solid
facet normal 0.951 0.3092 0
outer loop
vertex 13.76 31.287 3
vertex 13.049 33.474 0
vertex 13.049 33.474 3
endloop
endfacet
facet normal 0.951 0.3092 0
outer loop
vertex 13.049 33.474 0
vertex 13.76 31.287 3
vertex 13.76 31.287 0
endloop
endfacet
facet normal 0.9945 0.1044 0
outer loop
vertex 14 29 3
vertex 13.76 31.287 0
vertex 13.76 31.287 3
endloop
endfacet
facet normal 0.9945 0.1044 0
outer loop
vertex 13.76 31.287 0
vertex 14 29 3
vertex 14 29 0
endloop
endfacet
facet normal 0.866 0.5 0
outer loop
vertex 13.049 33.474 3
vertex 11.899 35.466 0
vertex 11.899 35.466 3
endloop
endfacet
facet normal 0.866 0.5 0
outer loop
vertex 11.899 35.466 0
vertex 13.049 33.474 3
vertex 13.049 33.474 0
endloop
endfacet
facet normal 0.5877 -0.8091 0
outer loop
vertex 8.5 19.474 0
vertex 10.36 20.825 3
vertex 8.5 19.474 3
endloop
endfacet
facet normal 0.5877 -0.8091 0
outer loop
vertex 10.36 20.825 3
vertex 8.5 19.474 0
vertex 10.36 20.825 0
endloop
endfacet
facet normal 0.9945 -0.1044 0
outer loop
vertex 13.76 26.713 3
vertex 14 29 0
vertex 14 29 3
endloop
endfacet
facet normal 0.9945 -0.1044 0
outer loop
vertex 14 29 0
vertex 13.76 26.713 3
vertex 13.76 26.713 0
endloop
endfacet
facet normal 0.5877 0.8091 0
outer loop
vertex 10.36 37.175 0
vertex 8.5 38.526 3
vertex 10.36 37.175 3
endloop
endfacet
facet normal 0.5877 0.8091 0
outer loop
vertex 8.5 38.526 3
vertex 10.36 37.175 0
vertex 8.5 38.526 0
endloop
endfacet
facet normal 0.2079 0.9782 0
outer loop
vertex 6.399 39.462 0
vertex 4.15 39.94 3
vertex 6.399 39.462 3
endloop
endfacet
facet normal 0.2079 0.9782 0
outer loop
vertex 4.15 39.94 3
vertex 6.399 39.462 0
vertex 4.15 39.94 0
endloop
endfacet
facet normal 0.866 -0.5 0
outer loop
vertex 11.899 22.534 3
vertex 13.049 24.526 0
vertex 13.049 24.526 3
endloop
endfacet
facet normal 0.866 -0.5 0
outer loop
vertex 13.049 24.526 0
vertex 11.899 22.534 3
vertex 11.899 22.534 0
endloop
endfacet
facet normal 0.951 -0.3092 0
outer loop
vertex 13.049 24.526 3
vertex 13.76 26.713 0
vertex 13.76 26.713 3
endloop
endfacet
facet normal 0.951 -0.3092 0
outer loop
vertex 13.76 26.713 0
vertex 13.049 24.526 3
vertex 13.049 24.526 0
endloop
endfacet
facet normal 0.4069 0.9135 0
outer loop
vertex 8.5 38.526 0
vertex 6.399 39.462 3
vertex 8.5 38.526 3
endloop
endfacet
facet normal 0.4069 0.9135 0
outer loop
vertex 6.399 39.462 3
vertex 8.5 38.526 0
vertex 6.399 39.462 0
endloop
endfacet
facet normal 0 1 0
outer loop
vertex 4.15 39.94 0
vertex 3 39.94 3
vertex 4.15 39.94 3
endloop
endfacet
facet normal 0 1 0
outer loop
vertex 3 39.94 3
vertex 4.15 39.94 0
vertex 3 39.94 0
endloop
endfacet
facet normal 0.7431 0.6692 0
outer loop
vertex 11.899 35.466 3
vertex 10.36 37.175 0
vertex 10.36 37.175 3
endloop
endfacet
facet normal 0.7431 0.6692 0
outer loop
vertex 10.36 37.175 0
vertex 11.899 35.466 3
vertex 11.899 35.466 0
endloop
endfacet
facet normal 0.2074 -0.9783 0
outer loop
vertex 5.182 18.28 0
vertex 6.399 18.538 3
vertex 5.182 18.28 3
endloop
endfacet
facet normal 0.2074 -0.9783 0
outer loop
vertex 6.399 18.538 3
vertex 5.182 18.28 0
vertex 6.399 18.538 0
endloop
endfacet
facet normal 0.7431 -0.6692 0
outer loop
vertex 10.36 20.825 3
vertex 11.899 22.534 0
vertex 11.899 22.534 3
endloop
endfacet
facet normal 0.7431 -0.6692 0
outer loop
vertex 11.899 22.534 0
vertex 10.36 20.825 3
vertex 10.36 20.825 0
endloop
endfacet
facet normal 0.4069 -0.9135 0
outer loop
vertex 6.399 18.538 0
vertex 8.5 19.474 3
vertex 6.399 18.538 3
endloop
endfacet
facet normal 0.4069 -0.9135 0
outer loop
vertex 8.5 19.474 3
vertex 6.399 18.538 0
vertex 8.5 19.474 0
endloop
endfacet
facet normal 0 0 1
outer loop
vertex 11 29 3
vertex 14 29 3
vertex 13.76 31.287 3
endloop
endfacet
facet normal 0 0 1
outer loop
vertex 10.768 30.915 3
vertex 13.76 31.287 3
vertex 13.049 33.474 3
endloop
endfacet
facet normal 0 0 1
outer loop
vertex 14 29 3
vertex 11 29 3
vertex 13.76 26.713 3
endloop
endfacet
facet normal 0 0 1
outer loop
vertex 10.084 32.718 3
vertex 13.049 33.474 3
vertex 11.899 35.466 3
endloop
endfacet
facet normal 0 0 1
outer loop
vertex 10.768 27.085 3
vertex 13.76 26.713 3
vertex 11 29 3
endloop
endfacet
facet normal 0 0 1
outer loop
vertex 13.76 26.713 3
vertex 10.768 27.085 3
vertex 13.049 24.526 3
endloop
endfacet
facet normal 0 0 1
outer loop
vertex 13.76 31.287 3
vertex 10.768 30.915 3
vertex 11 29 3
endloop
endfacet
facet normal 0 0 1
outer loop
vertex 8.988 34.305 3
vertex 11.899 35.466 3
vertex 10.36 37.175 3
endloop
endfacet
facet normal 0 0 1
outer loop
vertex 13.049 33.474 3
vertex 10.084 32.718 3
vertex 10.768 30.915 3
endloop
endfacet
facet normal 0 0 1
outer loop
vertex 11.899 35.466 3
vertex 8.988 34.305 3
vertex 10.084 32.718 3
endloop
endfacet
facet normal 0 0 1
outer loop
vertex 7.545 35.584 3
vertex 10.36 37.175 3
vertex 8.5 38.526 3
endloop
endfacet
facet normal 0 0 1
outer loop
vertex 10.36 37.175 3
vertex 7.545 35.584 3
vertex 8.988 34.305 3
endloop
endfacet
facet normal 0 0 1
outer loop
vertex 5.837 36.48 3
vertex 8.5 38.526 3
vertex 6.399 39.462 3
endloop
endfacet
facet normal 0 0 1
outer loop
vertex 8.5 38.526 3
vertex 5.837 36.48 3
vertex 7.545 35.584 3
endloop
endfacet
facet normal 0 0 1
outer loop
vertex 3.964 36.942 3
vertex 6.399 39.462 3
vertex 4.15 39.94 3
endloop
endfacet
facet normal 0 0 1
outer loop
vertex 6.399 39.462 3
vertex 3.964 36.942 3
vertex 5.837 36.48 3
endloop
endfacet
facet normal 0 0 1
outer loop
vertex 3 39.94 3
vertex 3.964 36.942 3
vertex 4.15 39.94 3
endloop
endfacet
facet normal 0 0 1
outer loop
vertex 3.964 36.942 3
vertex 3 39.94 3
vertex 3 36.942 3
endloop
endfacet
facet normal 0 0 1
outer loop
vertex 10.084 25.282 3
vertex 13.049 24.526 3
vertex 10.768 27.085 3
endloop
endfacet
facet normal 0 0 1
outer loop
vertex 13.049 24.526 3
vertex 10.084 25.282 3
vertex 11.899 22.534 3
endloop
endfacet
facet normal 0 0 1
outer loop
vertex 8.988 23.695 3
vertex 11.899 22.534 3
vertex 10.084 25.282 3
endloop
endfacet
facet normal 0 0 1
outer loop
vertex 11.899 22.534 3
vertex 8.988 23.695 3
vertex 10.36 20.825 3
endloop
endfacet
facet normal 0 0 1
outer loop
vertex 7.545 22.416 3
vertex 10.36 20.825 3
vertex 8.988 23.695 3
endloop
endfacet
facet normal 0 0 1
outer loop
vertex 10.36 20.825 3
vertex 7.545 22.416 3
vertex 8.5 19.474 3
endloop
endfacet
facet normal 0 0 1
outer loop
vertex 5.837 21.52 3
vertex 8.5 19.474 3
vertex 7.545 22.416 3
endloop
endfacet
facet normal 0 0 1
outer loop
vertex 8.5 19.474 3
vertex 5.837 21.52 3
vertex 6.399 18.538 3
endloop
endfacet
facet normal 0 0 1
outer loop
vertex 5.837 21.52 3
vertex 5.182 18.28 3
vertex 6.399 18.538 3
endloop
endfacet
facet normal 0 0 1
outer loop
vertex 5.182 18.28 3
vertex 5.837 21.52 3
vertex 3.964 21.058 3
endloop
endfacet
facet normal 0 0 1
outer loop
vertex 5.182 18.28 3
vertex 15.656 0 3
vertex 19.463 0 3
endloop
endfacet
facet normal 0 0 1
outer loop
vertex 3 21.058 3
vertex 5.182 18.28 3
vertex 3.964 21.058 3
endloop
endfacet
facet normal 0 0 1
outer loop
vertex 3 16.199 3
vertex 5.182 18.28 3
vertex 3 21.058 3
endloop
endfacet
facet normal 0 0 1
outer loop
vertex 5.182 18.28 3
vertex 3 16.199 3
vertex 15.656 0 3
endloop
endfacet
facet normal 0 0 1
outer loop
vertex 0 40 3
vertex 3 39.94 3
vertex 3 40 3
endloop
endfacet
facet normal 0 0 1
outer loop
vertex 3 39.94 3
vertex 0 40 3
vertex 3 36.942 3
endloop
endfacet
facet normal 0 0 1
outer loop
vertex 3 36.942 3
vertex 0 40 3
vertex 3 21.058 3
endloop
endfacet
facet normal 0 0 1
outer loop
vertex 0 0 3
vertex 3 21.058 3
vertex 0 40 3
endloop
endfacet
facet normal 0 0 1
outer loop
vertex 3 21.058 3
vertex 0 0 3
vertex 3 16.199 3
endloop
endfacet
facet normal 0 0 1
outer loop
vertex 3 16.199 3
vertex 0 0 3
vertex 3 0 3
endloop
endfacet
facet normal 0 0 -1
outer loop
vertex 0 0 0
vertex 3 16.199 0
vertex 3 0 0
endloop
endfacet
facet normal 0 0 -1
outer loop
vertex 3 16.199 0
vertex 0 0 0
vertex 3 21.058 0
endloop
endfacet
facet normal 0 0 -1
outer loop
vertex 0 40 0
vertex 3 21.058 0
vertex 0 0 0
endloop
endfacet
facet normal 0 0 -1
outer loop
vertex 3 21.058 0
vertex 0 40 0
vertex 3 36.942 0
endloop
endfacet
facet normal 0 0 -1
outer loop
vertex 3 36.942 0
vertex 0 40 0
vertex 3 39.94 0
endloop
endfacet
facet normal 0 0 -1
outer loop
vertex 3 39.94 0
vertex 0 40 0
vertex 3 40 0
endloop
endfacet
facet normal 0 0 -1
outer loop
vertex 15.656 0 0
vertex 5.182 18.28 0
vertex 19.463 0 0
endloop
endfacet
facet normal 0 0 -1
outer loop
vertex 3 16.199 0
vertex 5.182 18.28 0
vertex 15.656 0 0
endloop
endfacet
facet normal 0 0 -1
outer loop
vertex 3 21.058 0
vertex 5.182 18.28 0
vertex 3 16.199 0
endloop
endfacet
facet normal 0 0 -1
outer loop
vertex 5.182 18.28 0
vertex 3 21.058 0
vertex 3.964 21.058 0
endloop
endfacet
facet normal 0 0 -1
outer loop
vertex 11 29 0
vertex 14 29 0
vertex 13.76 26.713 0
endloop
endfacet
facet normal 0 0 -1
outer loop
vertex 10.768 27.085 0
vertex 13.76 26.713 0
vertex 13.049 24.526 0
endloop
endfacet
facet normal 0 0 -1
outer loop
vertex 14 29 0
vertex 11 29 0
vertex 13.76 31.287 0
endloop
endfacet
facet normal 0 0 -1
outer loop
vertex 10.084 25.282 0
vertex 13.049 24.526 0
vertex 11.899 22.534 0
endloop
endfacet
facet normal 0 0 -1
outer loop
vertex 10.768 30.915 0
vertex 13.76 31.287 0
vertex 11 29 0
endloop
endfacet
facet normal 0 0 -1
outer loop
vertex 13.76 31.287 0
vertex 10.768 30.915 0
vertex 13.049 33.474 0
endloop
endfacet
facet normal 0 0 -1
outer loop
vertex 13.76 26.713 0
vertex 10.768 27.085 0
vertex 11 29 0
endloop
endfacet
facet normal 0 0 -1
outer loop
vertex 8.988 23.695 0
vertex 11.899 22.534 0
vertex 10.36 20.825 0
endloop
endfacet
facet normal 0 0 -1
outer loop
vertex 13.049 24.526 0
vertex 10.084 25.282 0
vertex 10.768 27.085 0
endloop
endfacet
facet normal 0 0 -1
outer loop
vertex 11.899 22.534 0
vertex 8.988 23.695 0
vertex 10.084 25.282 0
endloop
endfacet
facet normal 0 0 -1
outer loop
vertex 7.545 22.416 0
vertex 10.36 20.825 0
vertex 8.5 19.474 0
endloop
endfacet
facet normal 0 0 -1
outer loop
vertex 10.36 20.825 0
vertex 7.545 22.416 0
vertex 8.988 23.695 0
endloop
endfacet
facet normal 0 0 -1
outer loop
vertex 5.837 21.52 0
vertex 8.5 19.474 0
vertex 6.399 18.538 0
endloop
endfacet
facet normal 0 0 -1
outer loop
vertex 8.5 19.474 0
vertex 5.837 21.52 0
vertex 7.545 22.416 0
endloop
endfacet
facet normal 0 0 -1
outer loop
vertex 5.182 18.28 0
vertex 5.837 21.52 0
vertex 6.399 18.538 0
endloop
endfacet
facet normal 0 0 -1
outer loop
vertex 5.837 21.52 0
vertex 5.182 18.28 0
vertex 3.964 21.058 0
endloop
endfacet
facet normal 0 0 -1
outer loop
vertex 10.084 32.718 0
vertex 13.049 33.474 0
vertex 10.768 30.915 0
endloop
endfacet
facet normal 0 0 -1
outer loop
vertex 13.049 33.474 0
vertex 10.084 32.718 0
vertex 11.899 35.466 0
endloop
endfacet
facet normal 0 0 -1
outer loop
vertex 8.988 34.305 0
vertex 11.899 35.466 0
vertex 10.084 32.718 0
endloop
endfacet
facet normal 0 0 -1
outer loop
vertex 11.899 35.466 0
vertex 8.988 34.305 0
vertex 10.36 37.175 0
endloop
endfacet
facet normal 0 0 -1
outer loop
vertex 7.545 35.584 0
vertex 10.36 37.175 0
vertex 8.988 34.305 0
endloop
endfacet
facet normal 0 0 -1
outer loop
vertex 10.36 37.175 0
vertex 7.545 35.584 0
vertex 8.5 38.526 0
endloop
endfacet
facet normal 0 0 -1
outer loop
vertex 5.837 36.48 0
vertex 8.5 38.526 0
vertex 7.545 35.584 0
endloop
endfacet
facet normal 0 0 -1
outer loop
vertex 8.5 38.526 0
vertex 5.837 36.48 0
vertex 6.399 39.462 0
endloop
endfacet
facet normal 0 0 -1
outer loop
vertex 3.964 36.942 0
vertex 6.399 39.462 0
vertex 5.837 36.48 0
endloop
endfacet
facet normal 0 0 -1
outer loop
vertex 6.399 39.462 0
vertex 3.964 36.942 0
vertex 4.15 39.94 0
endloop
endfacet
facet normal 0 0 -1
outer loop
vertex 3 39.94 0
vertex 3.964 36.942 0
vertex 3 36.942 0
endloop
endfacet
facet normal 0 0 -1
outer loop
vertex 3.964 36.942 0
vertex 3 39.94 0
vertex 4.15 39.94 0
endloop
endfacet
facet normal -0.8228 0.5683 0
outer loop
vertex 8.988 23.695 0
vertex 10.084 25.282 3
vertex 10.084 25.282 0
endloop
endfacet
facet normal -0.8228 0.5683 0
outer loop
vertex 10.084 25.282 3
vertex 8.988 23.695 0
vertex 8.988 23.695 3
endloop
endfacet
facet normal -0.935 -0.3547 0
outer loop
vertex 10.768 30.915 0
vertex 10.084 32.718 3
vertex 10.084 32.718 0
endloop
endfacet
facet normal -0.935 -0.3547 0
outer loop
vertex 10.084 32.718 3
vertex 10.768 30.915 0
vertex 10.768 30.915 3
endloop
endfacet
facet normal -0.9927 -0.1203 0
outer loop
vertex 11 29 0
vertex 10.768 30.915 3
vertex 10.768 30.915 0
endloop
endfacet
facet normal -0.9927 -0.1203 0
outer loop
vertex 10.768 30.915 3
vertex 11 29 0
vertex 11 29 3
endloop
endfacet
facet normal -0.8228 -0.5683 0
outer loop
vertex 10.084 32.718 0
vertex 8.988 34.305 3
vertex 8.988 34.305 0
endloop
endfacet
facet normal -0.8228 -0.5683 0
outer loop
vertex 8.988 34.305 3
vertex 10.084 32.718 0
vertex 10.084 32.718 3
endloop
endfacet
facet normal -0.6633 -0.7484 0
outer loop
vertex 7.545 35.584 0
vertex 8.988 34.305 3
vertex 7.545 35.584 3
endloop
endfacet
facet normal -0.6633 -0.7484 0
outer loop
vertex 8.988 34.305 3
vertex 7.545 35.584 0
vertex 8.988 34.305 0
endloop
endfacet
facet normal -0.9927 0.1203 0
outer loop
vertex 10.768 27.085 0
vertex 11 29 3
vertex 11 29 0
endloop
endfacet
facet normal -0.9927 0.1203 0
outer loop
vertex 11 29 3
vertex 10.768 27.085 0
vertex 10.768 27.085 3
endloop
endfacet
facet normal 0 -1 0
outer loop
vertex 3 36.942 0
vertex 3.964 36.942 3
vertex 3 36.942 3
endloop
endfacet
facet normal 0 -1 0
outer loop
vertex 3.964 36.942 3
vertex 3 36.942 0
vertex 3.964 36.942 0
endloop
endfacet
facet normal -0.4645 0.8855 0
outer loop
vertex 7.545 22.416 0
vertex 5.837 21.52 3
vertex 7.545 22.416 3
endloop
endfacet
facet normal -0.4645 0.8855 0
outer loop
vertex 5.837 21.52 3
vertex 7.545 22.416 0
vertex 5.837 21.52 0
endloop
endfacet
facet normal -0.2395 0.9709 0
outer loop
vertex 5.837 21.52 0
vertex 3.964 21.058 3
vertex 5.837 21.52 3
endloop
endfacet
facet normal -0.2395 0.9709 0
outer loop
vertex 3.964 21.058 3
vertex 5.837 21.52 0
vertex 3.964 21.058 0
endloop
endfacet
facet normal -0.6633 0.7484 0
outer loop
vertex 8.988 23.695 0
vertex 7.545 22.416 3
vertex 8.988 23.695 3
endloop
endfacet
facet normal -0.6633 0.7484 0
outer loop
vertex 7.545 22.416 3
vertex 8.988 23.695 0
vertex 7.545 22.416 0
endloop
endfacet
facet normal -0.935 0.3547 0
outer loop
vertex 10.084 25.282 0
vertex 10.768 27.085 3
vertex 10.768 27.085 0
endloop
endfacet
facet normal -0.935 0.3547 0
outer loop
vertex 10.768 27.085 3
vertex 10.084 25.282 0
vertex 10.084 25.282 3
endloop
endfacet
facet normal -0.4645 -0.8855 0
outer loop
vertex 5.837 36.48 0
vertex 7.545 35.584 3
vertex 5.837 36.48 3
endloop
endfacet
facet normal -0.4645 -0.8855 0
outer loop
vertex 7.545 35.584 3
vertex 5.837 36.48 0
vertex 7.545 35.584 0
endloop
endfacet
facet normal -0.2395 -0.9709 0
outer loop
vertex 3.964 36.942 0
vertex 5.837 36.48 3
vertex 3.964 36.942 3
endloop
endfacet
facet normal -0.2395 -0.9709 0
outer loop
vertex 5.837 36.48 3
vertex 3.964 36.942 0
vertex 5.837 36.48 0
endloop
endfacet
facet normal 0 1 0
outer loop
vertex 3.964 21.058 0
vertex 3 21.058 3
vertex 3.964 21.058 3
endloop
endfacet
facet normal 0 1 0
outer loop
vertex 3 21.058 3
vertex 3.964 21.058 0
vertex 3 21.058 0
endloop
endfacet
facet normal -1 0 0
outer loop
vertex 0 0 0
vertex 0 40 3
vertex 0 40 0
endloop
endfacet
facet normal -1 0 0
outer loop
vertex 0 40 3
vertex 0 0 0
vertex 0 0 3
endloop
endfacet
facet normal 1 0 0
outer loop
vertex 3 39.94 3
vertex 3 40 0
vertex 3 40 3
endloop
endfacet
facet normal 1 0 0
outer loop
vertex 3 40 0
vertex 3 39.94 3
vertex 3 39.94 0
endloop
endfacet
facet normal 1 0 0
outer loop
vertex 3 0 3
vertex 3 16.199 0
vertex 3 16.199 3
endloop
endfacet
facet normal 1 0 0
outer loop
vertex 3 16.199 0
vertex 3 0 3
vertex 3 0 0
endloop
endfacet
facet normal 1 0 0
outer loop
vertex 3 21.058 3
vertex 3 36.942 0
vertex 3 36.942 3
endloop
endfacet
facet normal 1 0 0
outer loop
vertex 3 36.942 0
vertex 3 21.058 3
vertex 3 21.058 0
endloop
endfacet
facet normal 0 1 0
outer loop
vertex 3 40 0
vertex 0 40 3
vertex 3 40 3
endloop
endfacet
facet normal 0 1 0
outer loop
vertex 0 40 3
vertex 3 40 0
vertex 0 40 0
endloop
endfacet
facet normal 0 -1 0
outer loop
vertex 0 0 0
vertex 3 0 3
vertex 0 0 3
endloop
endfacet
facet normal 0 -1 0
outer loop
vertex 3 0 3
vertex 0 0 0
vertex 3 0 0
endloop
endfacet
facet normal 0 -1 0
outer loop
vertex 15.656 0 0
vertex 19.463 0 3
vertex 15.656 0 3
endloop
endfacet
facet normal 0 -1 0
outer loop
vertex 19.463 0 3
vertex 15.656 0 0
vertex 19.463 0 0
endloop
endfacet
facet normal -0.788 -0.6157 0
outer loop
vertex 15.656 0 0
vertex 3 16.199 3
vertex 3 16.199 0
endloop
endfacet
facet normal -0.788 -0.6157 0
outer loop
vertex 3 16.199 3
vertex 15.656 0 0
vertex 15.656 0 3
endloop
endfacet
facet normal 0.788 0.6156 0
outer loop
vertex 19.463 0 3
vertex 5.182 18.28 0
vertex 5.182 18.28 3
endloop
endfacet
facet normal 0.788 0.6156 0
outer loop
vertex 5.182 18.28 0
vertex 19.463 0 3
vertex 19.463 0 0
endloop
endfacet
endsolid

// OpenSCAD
//R
union(){
difference(){
  union(){
  cube([3,40,3]);
difference(){
  translate([3,29,0]) cylinder(3,11,11);
  translate([3,29,-1]) cylinder(5,8,8);
  translate([-15,5,-1]) cube([15,40,5]);
}
translate([18,-3,0]) rotate([0,0,38]) cube([3,26,3]);
}
  translate([0,-13,-1]) cube([40,13,5]);

}
}
